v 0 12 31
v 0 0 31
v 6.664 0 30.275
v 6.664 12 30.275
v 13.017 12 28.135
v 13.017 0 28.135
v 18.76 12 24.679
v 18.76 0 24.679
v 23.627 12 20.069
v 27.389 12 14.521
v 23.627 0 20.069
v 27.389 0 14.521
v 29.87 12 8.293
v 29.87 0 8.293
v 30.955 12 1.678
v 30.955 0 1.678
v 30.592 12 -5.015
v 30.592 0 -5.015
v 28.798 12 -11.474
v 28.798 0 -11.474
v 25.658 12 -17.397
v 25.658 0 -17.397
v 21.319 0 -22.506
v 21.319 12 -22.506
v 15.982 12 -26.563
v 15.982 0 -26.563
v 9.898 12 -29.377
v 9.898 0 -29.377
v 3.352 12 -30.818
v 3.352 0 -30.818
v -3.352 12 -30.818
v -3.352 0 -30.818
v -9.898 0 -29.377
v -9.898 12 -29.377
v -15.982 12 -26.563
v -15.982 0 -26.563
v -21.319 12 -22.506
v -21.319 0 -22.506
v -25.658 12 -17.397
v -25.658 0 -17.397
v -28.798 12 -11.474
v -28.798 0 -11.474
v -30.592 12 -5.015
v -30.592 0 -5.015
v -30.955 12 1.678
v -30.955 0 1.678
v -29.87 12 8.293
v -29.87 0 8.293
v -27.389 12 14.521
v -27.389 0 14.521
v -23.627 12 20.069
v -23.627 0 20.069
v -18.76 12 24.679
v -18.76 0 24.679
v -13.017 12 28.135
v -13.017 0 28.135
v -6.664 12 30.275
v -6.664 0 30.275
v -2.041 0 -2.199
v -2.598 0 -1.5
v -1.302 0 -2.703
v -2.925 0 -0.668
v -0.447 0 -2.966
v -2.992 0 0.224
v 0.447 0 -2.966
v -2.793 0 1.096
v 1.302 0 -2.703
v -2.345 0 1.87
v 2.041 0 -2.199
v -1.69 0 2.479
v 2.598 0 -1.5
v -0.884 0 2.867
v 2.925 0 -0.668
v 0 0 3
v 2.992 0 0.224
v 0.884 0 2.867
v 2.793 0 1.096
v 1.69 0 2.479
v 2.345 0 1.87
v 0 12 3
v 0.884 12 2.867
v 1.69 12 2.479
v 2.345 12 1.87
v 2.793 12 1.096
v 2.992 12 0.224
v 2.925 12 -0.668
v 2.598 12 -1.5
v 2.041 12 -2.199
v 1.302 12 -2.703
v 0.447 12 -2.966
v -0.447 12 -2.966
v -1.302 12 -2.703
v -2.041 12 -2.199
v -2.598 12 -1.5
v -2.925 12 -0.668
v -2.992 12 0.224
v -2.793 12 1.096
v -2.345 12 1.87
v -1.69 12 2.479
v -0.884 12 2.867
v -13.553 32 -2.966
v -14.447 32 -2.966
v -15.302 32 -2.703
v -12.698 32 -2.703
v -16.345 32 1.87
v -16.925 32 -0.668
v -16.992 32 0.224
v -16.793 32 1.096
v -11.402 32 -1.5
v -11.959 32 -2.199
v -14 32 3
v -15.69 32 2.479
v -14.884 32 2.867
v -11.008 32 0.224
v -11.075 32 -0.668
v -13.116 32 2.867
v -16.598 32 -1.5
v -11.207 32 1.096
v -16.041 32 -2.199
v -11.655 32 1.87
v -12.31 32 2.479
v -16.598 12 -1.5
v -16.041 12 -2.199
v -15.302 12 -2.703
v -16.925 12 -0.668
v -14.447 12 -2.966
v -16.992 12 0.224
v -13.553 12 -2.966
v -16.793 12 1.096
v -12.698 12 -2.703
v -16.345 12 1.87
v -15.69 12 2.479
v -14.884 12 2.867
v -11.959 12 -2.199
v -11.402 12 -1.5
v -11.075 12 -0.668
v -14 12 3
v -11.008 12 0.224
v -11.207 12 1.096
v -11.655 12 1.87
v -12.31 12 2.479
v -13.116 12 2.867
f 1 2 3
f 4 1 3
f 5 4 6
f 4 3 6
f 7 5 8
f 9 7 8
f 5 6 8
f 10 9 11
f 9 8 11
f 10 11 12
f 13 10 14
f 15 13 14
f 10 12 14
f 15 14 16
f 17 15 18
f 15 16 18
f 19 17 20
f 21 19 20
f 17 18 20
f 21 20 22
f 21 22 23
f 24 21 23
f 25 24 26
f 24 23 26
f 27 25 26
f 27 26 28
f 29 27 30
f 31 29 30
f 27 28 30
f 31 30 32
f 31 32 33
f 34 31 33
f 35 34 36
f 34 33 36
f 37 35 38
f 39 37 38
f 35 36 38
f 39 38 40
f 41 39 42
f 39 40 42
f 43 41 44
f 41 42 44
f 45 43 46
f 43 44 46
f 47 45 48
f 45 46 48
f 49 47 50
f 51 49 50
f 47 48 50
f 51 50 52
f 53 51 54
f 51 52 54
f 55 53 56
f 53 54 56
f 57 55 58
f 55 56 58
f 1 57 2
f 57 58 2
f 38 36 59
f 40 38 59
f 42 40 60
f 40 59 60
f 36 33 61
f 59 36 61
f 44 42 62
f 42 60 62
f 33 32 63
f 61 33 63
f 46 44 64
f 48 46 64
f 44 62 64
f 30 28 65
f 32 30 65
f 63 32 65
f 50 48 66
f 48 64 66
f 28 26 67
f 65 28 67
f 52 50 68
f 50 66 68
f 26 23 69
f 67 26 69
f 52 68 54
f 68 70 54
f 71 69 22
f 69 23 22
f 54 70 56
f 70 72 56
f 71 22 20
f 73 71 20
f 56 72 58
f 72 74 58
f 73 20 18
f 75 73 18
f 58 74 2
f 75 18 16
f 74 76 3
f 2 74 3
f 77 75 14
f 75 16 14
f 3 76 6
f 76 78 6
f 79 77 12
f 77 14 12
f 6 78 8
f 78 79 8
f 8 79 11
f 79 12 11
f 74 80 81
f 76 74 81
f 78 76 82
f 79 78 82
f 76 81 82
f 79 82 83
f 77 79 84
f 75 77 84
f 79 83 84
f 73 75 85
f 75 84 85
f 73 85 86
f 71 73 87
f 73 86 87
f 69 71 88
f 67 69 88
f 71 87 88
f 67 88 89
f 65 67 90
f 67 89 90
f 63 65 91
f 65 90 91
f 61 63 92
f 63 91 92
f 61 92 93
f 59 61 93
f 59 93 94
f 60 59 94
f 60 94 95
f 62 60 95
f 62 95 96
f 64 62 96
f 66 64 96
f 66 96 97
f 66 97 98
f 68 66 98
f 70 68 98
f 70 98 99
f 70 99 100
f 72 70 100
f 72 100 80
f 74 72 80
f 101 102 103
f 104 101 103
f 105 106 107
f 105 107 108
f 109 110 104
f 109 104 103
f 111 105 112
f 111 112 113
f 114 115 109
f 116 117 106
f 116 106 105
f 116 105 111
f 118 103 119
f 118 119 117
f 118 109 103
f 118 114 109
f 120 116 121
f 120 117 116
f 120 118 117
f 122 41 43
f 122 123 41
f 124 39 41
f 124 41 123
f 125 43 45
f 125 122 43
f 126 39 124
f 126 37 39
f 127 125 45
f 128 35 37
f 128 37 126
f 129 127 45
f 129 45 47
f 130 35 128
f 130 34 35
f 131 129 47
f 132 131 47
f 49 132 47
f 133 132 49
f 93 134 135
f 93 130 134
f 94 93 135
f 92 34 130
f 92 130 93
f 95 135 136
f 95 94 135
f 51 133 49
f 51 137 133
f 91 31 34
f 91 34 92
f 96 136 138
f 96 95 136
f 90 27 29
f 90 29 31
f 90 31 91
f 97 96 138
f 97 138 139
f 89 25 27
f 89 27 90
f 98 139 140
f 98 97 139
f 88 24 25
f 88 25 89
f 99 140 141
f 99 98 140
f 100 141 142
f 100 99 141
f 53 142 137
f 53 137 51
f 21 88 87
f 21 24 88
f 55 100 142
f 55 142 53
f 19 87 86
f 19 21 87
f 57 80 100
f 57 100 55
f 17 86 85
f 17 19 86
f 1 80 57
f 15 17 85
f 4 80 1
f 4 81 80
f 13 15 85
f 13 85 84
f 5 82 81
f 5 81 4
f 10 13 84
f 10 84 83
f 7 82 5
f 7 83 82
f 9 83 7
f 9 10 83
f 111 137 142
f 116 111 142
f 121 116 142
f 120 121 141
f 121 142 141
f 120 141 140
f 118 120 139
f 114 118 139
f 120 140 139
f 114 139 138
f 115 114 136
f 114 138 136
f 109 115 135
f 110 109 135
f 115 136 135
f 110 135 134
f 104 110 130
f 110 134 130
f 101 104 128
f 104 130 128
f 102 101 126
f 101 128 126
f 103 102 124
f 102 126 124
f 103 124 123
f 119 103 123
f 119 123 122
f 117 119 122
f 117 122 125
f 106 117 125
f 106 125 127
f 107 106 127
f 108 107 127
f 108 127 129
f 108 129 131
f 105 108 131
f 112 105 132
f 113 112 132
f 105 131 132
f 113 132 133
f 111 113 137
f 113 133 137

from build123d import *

# Parameters (mm, degrees)
SKETCH1_R           = 31
BOSS_EXTRUDE1_DEPTH = 12
SKETCH2_R           = 3
CUT_EXTRUDE1_DEPTH  = 46.453272709
SKETCH3_R           = 3
BOSS_EXTRUDE2_DEPTH = 20


with BuildPart() as part:
    # Sketch1 → Boss-Extrude1 (new body)
    with BuildSketch(Plane(origin=(0, 0, 0), x_dir=(1, 0, 0), z_dir=(0, 1, 0))):
        with Locations(Location((0, 0, 0), (0, 0, 270))):
            Circle(SKETCH1_R)
    extrude(amount=BOSS_EXTRUDE1_DEPTH)

    # Sketch2 → Cut-Extrude1 (cut, through all)
    with BuildSketch(Plane(origin=(0, 12, 0), x_dir=(1, 0, 0), z_dir=(0, 1, 0))):
        with Locations(Location((0, 0, 0), (0, 0, 270))):
            Circle(SKETCH2_R)
    extrude(amount=-CUT_EXTRUDE1_DEPTH, mode=Mode.SUBTRACT)

    # Sketch3 → Boss-Extrude2 (add)
    with BuildSketch(Plane(origin=(0, 12, 0), x_dir=(1, 0, 0), z_dir=(0, 1, 0))):
        with Locations(Location((-14, 0, 0), (0, 0, 270))):
            Circle(SKETCH3_R)
    extrude(amount=BOSS_EXTRUDE2_DEPTH)


solid = part.part
